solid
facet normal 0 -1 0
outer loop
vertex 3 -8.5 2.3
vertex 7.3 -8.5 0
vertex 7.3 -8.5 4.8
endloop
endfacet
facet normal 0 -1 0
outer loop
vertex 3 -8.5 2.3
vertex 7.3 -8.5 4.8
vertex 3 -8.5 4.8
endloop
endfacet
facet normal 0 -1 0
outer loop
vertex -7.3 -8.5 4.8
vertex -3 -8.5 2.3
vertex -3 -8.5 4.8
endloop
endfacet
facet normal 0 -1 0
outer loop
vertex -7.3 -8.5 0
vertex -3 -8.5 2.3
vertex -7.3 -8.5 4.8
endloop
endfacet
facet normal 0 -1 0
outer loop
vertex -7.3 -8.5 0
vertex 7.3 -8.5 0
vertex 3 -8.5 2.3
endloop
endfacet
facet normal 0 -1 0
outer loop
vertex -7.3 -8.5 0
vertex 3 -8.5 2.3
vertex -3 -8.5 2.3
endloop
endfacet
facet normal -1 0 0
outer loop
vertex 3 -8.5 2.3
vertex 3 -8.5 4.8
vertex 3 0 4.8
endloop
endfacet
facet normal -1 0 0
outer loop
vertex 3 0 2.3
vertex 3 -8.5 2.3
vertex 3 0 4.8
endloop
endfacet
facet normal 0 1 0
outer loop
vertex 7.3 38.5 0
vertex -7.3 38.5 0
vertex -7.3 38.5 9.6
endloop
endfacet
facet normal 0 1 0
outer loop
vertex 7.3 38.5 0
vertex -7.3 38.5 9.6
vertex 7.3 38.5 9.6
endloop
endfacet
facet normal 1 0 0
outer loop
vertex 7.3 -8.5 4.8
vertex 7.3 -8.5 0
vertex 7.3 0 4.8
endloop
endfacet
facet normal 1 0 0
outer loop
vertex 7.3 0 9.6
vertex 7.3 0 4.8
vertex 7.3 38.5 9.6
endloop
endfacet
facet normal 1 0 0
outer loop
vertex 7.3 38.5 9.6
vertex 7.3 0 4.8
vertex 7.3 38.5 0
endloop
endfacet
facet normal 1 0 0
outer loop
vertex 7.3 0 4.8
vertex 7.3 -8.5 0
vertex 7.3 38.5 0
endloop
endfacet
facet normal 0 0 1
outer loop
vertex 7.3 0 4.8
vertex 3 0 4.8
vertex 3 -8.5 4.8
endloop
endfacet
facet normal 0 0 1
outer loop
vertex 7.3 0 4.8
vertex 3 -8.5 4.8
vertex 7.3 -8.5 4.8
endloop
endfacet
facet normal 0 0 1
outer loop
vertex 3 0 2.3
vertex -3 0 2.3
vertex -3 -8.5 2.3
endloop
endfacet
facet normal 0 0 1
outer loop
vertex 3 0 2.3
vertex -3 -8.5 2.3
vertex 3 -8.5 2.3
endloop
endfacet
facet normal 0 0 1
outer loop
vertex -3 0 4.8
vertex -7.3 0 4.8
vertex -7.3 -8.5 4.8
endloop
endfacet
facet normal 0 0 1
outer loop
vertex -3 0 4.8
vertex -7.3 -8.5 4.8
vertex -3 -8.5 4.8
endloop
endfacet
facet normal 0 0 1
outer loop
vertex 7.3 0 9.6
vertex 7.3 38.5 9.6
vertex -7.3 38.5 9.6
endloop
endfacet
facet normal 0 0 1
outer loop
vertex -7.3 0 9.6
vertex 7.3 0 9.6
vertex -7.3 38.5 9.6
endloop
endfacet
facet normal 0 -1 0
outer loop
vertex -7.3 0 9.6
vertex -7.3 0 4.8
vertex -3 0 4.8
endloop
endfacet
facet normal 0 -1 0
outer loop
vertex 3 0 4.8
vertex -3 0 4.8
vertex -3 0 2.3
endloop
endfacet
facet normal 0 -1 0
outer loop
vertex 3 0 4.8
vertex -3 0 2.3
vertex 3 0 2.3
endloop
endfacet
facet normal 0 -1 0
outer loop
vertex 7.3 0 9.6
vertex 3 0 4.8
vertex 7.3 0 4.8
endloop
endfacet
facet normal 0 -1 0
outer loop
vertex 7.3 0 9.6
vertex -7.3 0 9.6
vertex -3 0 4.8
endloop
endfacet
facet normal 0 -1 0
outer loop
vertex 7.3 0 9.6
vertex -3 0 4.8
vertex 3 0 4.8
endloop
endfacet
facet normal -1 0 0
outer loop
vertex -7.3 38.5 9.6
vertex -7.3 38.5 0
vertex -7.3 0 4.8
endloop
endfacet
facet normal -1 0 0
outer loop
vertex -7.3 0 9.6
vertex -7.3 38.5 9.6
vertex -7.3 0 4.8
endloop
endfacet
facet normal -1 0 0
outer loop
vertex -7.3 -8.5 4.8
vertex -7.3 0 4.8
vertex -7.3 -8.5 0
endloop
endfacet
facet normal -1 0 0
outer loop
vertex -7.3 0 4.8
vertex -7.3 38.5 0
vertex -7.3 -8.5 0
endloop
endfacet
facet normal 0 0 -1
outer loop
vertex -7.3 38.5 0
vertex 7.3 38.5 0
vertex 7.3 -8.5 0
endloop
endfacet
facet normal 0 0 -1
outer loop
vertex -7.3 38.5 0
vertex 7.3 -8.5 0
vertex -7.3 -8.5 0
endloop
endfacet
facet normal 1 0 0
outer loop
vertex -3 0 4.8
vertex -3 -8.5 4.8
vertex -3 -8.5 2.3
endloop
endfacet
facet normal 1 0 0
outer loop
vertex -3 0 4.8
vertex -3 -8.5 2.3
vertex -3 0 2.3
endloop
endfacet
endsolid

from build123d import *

# Parameters (mm, degrees)
EXTRUDE_1_DEPTH     = 9.6
SKETCH_2_W          = 14.6
SKETCH_2_H          = 8.5
CUT_EXTRUDE_1_DEPTH = 4.8
SKETCH_3_W          = 6
SKETCH_3_H          = 8.5
CUT_EXTRUDE_2_DEPTH = 2.5


with BuildPart() as part:
    # 草图1 → 凸台-拉伸1 (new body)
    with BuildSketch(Plane.XY):
        Polygon((-7.3, 0), (-7.3, 38.5), (7.3, 38.5), (7.3, 0), (7.3, -8.5), (-7.3, -8.5), align=None)
    extrude(amount=EXTRUDE_1_DEPTH)

    # 草图2 → 切除-拉伸1 (cut)
    with BuildSketch(Plane.XY.offset(9.6)):
        with Locations((0, -4.25)):
            Rectangle(SKETCH_2_W, SKETCH_2_H)
    extrude(amount=-CUT_EXTRUDE_1_DEPTH, mode=Mode.SUBTRACT)

    # 草图3 → 切除-拉伸2 (cut)
    with BuildSketch(Plane.XY.offset(4.8)):
        with Locations((0, -4.25)):
            Rectangle(SKETCH_3_W, SKETCH_3_H)
    extrude(amount=-CUT_EXTRUDE_2_DEPTH, mode=Mode.SUBTRACT)


solid = part.part
